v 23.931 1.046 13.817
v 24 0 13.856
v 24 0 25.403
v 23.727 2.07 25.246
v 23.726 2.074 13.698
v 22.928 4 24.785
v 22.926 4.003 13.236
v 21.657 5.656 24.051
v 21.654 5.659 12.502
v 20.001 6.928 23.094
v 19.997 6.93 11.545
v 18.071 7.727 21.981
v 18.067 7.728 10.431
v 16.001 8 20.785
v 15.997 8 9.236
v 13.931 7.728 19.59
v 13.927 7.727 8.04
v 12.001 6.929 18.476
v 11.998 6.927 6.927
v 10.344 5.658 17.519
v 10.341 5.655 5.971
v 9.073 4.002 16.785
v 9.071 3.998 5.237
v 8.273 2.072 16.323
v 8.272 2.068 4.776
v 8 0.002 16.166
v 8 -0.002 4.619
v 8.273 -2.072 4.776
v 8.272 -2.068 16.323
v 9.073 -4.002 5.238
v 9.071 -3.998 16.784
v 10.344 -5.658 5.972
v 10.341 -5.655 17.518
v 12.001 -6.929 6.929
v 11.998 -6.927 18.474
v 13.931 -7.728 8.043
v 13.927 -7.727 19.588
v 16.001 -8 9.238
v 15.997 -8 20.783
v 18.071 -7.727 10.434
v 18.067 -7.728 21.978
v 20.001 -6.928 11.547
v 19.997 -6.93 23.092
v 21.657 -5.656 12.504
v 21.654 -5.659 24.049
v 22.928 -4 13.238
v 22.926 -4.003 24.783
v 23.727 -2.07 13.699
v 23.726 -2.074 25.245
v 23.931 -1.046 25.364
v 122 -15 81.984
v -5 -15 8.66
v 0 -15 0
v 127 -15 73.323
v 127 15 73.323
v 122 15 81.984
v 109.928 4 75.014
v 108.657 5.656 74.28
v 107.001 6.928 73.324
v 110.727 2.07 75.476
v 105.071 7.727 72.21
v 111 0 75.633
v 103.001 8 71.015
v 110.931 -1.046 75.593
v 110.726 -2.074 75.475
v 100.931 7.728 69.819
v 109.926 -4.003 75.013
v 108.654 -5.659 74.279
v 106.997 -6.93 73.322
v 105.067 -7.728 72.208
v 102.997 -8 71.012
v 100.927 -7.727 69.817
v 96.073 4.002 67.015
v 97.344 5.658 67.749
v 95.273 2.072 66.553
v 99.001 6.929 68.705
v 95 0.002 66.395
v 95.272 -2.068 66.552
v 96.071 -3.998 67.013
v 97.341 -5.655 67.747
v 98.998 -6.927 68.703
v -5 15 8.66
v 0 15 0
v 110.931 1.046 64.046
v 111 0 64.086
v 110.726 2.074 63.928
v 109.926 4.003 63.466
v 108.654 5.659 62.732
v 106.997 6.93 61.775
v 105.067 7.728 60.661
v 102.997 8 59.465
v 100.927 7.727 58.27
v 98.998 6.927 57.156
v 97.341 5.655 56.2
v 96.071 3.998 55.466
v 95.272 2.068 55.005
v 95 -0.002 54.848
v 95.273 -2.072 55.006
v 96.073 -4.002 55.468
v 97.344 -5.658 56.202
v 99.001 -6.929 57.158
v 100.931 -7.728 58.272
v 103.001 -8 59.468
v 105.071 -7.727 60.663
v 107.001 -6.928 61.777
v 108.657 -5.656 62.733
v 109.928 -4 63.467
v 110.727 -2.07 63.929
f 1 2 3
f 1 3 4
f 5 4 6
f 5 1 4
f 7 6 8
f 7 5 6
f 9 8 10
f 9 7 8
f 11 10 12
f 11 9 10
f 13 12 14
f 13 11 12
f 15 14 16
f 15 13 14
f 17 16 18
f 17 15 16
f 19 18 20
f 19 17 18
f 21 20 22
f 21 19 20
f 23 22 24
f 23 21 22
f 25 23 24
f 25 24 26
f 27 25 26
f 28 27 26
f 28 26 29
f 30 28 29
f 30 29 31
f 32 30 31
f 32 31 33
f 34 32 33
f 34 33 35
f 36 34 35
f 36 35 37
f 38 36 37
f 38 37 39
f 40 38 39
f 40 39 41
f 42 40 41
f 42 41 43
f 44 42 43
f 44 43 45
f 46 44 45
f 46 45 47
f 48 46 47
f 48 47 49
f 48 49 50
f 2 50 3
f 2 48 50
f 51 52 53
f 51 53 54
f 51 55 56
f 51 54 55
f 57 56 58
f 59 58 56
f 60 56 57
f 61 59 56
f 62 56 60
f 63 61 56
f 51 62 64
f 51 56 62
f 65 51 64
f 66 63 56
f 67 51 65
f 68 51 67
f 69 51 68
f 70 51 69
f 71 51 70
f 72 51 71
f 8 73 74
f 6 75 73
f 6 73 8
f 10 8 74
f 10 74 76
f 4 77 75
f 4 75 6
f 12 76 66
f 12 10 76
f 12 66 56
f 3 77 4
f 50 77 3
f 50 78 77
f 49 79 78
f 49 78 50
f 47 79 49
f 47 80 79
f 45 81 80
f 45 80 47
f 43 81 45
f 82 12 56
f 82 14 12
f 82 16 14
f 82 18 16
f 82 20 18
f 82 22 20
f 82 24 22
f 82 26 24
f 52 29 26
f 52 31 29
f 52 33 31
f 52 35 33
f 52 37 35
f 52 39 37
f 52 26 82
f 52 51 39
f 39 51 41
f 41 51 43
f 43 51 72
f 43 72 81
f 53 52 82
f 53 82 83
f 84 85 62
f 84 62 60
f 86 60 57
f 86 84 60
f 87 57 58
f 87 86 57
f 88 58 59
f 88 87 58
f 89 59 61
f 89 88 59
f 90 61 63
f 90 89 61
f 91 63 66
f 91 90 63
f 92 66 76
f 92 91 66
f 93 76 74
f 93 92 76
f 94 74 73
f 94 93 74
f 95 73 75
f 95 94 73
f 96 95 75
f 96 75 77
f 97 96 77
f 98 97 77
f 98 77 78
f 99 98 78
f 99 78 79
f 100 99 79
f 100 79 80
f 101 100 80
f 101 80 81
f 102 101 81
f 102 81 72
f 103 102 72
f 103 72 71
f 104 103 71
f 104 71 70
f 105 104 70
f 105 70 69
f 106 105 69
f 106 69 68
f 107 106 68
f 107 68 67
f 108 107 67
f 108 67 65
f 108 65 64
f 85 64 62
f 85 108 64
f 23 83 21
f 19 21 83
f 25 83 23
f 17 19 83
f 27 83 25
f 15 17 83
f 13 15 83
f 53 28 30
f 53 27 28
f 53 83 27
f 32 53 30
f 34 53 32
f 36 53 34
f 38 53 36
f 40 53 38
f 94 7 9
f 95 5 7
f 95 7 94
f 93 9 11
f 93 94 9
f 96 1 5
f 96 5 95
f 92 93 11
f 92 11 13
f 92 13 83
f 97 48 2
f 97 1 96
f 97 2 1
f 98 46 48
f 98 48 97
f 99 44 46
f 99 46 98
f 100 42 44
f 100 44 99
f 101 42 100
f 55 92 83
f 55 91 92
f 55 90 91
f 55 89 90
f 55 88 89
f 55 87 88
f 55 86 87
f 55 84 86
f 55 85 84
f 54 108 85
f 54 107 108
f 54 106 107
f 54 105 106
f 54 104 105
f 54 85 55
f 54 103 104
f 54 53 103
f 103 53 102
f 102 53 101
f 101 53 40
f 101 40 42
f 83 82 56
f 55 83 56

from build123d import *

# Parameters (mm, degrees)
F2_DEPTH = 15
F0_R     = 8
F3_DEPTH = 81.984738


with BuildPart() as f2:
    # F1 (on Front) → F2 (new body, symmetric)
    with BuildSketch(Plane.XZ):
        Polygon((122, 81.983738), (-5, 8.660254), (0, 0), (127, 73.323484), align=None)
    extrude(amount=F2_DEPTH, both=True)

    # F0 (on Top) → F3 (cut, through all)
    with BuildSketch(Plane.XY):
        with Locations((16, 0)):
            Circle(F0_R)
        with Locations((103, 0)):
            Circle(F0_R)
    extrude(amount=F3_DEPTH, mode=Mode.SUBTRACT)


solid = f2.part
